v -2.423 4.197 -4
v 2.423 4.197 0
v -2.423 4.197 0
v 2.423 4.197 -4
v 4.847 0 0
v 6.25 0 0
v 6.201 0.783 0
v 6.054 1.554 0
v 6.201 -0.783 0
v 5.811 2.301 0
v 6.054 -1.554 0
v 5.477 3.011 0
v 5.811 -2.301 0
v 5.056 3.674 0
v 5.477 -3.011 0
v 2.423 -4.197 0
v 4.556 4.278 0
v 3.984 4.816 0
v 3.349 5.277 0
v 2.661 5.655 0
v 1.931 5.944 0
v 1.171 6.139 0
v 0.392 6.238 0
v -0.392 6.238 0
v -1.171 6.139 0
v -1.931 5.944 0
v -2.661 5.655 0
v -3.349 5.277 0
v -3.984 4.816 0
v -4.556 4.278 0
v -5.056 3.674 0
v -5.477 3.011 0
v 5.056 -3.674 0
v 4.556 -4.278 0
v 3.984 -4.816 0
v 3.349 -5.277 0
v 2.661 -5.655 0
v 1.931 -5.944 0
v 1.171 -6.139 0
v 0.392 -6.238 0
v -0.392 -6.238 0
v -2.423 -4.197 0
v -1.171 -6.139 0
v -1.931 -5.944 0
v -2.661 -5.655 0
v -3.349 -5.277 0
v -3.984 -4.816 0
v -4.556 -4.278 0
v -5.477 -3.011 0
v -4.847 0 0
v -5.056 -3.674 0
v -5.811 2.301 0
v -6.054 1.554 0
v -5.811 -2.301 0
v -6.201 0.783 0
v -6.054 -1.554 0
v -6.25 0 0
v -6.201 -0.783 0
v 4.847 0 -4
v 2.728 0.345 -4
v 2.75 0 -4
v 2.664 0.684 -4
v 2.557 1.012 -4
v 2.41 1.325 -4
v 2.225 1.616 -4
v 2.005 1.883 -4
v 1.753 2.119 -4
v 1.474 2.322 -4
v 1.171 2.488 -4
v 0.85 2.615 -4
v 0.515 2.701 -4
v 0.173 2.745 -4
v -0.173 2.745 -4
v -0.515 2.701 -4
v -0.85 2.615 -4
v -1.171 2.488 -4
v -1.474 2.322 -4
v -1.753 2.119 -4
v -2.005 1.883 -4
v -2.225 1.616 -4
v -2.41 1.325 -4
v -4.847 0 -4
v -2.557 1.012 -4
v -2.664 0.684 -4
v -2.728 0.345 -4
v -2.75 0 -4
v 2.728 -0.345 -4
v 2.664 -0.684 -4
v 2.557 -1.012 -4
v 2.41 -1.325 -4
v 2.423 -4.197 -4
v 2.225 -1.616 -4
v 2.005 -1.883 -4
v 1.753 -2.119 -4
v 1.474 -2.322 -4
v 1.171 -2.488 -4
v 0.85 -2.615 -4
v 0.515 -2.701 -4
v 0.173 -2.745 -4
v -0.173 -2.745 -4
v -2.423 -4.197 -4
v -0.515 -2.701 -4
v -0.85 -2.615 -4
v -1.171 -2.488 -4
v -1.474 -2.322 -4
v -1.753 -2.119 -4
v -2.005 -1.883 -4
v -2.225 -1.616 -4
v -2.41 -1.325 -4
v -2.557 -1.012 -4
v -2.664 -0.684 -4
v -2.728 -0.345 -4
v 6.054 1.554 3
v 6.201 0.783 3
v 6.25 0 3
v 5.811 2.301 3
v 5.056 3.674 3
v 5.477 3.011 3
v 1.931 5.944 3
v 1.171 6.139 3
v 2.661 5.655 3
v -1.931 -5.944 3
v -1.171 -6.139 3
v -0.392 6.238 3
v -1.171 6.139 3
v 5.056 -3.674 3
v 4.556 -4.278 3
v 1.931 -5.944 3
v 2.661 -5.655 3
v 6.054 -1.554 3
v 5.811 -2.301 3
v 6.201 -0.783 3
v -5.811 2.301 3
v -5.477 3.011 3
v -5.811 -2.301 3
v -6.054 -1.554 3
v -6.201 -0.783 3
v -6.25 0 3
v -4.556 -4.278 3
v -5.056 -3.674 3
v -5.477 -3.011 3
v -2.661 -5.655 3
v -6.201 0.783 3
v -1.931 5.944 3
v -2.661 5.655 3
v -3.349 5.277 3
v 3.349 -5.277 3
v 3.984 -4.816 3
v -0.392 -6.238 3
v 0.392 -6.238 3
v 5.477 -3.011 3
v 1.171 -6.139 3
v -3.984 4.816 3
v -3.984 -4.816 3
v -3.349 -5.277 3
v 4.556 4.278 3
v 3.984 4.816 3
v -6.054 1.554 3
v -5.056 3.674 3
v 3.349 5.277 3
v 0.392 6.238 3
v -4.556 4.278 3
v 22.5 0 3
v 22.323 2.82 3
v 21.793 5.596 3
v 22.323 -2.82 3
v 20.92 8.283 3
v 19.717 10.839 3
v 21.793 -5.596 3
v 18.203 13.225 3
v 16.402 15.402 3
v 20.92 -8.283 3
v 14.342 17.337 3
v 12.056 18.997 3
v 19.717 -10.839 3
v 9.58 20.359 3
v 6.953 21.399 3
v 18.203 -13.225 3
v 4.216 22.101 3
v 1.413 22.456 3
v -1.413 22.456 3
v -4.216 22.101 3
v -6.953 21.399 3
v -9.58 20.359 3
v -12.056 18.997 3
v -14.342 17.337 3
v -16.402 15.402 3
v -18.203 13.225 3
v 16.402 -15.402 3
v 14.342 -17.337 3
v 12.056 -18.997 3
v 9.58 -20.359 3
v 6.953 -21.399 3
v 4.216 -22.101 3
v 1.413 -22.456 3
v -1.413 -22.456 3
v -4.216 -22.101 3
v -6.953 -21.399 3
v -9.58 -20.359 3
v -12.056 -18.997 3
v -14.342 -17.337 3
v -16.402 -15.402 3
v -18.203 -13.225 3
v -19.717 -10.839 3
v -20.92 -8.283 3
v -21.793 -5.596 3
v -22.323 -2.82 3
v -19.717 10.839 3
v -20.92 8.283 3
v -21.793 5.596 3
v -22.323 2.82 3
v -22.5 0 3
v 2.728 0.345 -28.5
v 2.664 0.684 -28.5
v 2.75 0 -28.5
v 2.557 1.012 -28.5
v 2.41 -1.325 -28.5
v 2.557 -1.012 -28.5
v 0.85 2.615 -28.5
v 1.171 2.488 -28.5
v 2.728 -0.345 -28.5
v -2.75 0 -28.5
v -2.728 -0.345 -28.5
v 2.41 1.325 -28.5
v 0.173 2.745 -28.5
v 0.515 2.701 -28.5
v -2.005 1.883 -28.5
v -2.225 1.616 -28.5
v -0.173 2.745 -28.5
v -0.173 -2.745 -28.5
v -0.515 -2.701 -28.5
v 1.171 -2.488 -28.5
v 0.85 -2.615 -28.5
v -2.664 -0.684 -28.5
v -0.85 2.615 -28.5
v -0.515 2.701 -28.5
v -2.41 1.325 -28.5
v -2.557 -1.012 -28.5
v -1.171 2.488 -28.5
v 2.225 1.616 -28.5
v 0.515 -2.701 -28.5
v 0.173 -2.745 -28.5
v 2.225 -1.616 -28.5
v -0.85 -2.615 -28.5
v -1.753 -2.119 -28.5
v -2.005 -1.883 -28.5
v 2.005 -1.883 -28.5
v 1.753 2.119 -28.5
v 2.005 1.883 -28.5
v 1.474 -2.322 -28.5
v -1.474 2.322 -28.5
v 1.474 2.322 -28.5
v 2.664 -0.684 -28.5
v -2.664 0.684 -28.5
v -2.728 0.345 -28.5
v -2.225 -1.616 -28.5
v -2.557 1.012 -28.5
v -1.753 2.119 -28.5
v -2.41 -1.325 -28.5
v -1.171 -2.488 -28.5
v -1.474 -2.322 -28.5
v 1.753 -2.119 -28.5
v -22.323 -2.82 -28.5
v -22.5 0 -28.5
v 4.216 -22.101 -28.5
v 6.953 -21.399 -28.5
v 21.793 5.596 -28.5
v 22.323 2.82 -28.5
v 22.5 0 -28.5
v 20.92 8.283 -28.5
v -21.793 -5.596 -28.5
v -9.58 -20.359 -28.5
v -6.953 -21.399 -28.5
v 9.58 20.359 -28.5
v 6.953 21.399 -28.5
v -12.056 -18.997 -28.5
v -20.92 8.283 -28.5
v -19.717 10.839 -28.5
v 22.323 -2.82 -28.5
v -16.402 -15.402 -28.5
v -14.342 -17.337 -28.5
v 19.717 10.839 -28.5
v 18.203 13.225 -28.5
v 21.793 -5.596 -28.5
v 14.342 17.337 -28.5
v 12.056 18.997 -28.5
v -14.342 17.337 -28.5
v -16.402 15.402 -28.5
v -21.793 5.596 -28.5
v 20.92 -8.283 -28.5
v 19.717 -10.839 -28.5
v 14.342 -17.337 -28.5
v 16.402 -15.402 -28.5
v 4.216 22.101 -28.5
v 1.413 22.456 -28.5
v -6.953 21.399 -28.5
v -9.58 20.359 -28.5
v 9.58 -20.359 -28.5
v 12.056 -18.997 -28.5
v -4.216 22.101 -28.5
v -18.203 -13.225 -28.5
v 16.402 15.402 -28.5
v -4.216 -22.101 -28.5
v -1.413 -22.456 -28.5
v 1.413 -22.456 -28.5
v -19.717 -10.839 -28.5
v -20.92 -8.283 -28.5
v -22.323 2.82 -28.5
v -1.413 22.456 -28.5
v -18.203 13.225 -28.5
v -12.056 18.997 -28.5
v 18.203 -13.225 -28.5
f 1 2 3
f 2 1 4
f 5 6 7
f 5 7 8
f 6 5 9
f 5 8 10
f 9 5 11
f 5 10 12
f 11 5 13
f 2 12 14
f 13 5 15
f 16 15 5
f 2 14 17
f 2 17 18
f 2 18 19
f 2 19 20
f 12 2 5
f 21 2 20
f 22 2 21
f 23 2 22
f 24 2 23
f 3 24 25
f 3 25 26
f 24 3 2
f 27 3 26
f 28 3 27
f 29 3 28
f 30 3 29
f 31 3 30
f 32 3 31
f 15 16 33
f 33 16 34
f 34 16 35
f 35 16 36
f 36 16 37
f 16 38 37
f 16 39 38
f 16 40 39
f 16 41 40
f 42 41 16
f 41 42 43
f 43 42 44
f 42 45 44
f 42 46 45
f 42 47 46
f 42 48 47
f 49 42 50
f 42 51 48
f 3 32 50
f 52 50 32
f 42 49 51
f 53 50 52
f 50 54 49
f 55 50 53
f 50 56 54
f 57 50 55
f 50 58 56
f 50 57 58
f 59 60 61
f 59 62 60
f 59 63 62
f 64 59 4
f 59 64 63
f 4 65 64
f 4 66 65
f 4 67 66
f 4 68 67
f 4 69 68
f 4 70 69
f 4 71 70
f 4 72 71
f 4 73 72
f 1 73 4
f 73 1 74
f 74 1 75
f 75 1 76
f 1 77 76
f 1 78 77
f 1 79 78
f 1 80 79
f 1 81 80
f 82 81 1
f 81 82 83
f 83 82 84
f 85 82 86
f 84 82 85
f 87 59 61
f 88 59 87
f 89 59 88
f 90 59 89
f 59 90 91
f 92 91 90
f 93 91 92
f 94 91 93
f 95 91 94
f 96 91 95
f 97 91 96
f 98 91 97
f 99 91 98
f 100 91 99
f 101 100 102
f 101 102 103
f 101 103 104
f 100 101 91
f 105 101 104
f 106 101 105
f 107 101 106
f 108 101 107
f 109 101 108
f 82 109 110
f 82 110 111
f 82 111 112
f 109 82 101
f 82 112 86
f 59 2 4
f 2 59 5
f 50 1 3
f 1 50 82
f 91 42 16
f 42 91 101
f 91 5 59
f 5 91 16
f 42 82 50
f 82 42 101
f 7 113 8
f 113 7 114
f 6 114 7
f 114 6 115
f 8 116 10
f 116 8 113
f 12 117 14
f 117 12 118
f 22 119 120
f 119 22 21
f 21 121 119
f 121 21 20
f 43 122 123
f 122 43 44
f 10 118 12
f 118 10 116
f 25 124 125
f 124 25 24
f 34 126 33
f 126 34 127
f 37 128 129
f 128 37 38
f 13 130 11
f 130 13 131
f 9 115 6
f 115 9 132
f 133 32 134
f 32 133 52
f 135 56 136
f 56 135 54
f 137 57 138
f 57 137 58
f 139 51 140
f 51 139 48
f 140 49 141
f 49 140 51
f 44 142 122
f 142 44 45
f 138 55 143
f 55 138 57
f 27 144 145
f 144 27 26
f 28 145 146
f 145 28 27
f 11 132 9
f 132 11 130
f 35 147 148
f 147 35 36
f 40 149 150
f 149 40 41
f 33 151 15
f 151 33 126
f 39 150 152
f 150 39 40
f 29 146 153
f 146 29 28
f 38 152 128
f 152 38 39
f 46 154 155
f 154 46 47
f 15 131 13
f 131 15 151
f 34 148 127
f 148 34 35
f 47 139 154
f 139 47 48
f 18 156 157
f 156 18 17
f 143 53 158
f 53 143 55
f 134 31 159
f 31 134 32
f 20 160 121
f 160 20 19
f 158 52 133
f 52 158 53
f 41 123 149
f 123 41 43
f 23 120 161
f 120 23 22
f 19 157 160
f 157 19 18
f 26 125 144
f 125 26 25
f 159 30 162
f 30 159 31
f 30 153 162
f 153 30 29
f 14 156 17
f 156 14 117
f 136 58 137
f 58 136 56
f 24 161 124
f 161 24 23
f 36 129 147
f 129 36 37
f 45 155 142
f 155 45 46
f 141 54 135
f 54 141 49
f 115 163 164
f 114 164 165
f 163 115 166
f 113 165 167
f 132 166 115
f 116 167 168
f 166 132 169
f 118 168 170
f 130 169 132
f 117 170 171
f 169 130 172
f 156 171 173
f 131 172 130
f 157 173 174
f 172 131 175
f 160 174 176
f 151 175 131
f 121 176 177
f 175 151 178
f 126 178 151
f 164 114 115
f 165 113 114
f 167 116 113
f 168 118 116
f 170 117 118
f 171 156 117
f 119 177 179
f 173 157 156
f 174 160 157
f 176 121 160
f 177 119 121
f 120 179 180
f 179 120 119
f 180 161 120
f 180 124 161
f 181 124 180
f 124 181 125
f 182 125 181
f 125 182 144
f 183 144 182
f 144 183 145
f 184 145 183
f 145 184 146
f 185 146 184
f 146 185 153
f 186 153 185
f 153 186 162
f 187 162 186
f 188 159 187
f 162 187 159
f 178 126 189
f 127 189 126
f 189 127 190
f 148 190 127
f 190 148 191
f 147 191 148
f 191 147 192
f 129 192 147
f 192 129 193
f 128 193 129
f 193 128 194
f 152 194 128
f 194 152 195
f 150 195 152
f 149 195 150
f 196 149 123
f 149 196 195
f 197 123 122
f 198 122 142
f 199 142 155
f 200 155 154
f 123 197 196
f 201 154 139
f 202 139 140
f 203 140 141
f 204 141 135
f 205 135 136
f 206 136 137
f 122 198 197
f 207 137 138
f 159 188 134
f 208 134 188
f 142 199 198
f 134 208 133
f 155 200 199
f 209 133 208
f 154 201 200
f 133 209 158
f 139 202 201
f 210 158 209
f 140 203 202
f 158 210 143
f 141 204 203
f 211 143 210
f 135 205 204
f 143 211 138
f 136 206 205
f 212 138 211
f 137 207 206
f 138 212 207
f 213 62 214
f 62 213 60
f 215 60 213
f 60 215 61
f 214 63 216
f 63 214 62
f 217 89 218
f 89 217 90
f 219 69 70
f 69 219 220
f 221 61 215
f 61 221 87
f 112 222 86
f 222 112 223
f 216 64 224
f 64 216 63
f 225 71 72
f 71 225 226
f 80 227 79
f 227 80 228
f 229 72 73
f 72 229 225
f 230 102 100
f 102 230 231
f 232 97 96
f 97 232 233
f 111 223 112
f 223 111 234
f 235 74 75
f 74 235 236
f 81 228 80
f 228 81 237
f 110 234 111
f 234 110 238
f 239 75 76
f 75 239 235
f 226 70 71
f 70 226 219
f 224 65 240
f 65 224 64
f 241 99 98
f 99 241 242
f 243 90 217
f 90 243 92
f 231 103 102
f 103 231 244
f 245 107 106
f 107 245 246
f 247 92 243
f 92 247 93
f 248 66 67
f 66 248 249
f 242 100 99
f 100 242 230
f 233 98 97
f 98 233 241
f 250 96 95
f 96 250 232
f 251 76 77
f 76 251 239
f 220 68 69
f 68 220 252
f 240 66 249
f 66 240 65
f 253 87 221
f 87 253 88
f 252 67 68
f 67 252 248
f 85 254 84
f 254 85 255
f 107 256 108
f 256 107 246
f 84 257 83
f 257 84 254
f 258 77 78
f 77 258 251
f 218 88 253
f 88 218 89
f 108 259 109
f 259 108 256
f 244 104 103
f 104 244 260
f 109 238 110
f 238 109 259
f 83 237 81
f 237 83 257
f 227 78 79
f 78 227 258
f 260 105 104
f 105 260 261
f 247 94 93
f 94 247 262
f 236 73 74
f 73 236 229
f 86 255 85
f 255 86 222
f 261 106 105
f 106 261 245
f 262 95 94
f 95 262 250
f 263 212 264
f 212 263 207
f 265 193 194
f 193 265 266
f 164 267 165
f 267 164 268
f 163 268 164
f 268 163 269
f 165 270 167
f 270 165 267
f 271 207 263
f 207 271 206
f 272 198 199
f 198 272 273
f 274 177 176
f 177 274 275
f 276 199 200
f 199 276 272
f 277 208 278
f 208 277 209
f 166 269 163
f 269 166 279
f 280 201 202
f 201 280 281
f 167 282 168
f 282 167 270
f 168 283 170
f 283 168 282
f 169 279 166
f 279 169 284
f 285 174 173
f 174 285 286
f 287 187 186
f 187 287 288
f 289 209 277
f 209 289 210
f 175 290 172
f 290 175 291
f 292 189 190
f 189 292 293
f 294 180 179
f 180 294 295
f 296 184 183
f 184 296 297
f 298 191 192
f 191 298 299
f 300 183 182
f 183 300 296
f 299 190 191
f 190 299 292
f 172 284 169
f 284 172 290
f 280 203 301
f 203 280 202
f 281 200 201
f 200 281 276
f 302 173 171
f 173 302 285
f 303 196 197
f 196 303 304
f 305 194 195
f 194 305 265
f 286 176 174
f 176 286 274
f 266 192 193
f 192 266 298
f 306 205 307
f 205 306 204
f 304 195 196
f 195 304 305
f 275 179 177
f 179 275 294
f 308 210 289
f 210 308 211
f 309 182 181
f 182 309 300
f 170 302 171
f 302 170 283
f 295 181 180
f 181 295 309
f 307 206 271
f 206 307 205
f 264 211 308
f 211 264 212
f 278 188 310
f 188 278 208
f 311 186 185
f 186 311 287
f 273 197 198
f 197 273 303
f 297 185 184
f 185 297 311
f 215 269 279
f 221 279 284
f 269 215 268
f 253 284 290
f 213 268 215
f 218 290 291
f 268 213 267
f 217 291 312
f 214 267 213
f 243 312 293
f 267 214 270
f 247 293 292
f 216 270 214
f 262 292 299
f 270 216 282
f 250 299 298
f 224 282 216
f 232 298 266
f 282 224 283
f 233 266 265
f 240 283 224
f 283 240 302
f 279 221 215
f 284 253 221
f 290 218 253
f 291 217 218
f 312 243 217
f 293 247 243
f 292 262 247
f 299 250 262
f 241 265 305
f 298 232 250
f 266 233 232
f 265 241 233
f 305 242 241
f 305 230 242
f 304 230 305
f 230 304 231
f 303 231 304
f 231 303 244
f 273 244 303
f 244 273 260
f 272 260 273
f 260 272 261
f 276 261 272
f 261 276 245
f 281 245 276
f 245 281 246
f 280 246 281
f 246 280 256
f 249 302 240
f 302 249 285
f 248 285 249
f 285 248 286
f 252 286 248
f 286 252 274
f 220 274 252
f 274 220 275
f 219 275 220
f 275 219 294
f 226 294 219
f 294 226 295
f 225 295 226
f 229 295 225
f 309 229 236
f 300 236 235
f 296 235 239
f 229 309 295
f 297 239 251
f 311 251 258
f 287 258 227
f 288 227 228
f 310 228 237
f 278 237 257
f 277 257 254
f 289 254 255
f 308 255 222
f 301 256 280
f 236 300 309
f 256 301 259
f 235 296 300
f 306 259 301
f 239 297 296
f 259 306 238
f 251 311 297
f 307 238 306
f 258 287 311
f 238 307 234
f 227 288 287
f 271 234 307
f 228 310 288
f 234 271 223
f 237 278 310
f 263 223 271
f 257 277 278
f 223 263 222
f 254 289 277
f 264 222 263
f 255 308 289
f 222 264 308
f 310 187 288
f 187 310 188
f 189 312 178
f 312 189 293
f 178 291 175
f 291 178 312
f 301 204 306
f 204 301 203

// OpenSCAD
$fn = 50;


difference() {
	union() {
		translate(v = [0, 0, -28.5000000000]) {
			cylinder(h = 31.5000000000, r = 22.5000000000);
		}
	}
	union() {
		translate(v = [0, 0, 0]) {
			rotate(a = [0, 0, 0]) {
				difference() {
					union() {
						translate(v = [0, 0, -4]) {
							linear_extrude(height = 4) {
								polygon(points = [[4.8468000000, 0.0000000000], [2.4234000000, 4.1974519271], [-2.4234000000, 4.1974519271], [-4.8468000000, 0.0000000000], [-2.4234000000, -4.1974519271], [2.4234000000, -4.1974519271]]);
							}
						}
					}
					union();
				}
			}
		}
		#cylinder(h = 3, r = 6.2500000000);
		#translate(v = [0, 0, -100.0000000000]) {
			cylinder(h = 200, r = 2.7500000000);
		}
	}
}
